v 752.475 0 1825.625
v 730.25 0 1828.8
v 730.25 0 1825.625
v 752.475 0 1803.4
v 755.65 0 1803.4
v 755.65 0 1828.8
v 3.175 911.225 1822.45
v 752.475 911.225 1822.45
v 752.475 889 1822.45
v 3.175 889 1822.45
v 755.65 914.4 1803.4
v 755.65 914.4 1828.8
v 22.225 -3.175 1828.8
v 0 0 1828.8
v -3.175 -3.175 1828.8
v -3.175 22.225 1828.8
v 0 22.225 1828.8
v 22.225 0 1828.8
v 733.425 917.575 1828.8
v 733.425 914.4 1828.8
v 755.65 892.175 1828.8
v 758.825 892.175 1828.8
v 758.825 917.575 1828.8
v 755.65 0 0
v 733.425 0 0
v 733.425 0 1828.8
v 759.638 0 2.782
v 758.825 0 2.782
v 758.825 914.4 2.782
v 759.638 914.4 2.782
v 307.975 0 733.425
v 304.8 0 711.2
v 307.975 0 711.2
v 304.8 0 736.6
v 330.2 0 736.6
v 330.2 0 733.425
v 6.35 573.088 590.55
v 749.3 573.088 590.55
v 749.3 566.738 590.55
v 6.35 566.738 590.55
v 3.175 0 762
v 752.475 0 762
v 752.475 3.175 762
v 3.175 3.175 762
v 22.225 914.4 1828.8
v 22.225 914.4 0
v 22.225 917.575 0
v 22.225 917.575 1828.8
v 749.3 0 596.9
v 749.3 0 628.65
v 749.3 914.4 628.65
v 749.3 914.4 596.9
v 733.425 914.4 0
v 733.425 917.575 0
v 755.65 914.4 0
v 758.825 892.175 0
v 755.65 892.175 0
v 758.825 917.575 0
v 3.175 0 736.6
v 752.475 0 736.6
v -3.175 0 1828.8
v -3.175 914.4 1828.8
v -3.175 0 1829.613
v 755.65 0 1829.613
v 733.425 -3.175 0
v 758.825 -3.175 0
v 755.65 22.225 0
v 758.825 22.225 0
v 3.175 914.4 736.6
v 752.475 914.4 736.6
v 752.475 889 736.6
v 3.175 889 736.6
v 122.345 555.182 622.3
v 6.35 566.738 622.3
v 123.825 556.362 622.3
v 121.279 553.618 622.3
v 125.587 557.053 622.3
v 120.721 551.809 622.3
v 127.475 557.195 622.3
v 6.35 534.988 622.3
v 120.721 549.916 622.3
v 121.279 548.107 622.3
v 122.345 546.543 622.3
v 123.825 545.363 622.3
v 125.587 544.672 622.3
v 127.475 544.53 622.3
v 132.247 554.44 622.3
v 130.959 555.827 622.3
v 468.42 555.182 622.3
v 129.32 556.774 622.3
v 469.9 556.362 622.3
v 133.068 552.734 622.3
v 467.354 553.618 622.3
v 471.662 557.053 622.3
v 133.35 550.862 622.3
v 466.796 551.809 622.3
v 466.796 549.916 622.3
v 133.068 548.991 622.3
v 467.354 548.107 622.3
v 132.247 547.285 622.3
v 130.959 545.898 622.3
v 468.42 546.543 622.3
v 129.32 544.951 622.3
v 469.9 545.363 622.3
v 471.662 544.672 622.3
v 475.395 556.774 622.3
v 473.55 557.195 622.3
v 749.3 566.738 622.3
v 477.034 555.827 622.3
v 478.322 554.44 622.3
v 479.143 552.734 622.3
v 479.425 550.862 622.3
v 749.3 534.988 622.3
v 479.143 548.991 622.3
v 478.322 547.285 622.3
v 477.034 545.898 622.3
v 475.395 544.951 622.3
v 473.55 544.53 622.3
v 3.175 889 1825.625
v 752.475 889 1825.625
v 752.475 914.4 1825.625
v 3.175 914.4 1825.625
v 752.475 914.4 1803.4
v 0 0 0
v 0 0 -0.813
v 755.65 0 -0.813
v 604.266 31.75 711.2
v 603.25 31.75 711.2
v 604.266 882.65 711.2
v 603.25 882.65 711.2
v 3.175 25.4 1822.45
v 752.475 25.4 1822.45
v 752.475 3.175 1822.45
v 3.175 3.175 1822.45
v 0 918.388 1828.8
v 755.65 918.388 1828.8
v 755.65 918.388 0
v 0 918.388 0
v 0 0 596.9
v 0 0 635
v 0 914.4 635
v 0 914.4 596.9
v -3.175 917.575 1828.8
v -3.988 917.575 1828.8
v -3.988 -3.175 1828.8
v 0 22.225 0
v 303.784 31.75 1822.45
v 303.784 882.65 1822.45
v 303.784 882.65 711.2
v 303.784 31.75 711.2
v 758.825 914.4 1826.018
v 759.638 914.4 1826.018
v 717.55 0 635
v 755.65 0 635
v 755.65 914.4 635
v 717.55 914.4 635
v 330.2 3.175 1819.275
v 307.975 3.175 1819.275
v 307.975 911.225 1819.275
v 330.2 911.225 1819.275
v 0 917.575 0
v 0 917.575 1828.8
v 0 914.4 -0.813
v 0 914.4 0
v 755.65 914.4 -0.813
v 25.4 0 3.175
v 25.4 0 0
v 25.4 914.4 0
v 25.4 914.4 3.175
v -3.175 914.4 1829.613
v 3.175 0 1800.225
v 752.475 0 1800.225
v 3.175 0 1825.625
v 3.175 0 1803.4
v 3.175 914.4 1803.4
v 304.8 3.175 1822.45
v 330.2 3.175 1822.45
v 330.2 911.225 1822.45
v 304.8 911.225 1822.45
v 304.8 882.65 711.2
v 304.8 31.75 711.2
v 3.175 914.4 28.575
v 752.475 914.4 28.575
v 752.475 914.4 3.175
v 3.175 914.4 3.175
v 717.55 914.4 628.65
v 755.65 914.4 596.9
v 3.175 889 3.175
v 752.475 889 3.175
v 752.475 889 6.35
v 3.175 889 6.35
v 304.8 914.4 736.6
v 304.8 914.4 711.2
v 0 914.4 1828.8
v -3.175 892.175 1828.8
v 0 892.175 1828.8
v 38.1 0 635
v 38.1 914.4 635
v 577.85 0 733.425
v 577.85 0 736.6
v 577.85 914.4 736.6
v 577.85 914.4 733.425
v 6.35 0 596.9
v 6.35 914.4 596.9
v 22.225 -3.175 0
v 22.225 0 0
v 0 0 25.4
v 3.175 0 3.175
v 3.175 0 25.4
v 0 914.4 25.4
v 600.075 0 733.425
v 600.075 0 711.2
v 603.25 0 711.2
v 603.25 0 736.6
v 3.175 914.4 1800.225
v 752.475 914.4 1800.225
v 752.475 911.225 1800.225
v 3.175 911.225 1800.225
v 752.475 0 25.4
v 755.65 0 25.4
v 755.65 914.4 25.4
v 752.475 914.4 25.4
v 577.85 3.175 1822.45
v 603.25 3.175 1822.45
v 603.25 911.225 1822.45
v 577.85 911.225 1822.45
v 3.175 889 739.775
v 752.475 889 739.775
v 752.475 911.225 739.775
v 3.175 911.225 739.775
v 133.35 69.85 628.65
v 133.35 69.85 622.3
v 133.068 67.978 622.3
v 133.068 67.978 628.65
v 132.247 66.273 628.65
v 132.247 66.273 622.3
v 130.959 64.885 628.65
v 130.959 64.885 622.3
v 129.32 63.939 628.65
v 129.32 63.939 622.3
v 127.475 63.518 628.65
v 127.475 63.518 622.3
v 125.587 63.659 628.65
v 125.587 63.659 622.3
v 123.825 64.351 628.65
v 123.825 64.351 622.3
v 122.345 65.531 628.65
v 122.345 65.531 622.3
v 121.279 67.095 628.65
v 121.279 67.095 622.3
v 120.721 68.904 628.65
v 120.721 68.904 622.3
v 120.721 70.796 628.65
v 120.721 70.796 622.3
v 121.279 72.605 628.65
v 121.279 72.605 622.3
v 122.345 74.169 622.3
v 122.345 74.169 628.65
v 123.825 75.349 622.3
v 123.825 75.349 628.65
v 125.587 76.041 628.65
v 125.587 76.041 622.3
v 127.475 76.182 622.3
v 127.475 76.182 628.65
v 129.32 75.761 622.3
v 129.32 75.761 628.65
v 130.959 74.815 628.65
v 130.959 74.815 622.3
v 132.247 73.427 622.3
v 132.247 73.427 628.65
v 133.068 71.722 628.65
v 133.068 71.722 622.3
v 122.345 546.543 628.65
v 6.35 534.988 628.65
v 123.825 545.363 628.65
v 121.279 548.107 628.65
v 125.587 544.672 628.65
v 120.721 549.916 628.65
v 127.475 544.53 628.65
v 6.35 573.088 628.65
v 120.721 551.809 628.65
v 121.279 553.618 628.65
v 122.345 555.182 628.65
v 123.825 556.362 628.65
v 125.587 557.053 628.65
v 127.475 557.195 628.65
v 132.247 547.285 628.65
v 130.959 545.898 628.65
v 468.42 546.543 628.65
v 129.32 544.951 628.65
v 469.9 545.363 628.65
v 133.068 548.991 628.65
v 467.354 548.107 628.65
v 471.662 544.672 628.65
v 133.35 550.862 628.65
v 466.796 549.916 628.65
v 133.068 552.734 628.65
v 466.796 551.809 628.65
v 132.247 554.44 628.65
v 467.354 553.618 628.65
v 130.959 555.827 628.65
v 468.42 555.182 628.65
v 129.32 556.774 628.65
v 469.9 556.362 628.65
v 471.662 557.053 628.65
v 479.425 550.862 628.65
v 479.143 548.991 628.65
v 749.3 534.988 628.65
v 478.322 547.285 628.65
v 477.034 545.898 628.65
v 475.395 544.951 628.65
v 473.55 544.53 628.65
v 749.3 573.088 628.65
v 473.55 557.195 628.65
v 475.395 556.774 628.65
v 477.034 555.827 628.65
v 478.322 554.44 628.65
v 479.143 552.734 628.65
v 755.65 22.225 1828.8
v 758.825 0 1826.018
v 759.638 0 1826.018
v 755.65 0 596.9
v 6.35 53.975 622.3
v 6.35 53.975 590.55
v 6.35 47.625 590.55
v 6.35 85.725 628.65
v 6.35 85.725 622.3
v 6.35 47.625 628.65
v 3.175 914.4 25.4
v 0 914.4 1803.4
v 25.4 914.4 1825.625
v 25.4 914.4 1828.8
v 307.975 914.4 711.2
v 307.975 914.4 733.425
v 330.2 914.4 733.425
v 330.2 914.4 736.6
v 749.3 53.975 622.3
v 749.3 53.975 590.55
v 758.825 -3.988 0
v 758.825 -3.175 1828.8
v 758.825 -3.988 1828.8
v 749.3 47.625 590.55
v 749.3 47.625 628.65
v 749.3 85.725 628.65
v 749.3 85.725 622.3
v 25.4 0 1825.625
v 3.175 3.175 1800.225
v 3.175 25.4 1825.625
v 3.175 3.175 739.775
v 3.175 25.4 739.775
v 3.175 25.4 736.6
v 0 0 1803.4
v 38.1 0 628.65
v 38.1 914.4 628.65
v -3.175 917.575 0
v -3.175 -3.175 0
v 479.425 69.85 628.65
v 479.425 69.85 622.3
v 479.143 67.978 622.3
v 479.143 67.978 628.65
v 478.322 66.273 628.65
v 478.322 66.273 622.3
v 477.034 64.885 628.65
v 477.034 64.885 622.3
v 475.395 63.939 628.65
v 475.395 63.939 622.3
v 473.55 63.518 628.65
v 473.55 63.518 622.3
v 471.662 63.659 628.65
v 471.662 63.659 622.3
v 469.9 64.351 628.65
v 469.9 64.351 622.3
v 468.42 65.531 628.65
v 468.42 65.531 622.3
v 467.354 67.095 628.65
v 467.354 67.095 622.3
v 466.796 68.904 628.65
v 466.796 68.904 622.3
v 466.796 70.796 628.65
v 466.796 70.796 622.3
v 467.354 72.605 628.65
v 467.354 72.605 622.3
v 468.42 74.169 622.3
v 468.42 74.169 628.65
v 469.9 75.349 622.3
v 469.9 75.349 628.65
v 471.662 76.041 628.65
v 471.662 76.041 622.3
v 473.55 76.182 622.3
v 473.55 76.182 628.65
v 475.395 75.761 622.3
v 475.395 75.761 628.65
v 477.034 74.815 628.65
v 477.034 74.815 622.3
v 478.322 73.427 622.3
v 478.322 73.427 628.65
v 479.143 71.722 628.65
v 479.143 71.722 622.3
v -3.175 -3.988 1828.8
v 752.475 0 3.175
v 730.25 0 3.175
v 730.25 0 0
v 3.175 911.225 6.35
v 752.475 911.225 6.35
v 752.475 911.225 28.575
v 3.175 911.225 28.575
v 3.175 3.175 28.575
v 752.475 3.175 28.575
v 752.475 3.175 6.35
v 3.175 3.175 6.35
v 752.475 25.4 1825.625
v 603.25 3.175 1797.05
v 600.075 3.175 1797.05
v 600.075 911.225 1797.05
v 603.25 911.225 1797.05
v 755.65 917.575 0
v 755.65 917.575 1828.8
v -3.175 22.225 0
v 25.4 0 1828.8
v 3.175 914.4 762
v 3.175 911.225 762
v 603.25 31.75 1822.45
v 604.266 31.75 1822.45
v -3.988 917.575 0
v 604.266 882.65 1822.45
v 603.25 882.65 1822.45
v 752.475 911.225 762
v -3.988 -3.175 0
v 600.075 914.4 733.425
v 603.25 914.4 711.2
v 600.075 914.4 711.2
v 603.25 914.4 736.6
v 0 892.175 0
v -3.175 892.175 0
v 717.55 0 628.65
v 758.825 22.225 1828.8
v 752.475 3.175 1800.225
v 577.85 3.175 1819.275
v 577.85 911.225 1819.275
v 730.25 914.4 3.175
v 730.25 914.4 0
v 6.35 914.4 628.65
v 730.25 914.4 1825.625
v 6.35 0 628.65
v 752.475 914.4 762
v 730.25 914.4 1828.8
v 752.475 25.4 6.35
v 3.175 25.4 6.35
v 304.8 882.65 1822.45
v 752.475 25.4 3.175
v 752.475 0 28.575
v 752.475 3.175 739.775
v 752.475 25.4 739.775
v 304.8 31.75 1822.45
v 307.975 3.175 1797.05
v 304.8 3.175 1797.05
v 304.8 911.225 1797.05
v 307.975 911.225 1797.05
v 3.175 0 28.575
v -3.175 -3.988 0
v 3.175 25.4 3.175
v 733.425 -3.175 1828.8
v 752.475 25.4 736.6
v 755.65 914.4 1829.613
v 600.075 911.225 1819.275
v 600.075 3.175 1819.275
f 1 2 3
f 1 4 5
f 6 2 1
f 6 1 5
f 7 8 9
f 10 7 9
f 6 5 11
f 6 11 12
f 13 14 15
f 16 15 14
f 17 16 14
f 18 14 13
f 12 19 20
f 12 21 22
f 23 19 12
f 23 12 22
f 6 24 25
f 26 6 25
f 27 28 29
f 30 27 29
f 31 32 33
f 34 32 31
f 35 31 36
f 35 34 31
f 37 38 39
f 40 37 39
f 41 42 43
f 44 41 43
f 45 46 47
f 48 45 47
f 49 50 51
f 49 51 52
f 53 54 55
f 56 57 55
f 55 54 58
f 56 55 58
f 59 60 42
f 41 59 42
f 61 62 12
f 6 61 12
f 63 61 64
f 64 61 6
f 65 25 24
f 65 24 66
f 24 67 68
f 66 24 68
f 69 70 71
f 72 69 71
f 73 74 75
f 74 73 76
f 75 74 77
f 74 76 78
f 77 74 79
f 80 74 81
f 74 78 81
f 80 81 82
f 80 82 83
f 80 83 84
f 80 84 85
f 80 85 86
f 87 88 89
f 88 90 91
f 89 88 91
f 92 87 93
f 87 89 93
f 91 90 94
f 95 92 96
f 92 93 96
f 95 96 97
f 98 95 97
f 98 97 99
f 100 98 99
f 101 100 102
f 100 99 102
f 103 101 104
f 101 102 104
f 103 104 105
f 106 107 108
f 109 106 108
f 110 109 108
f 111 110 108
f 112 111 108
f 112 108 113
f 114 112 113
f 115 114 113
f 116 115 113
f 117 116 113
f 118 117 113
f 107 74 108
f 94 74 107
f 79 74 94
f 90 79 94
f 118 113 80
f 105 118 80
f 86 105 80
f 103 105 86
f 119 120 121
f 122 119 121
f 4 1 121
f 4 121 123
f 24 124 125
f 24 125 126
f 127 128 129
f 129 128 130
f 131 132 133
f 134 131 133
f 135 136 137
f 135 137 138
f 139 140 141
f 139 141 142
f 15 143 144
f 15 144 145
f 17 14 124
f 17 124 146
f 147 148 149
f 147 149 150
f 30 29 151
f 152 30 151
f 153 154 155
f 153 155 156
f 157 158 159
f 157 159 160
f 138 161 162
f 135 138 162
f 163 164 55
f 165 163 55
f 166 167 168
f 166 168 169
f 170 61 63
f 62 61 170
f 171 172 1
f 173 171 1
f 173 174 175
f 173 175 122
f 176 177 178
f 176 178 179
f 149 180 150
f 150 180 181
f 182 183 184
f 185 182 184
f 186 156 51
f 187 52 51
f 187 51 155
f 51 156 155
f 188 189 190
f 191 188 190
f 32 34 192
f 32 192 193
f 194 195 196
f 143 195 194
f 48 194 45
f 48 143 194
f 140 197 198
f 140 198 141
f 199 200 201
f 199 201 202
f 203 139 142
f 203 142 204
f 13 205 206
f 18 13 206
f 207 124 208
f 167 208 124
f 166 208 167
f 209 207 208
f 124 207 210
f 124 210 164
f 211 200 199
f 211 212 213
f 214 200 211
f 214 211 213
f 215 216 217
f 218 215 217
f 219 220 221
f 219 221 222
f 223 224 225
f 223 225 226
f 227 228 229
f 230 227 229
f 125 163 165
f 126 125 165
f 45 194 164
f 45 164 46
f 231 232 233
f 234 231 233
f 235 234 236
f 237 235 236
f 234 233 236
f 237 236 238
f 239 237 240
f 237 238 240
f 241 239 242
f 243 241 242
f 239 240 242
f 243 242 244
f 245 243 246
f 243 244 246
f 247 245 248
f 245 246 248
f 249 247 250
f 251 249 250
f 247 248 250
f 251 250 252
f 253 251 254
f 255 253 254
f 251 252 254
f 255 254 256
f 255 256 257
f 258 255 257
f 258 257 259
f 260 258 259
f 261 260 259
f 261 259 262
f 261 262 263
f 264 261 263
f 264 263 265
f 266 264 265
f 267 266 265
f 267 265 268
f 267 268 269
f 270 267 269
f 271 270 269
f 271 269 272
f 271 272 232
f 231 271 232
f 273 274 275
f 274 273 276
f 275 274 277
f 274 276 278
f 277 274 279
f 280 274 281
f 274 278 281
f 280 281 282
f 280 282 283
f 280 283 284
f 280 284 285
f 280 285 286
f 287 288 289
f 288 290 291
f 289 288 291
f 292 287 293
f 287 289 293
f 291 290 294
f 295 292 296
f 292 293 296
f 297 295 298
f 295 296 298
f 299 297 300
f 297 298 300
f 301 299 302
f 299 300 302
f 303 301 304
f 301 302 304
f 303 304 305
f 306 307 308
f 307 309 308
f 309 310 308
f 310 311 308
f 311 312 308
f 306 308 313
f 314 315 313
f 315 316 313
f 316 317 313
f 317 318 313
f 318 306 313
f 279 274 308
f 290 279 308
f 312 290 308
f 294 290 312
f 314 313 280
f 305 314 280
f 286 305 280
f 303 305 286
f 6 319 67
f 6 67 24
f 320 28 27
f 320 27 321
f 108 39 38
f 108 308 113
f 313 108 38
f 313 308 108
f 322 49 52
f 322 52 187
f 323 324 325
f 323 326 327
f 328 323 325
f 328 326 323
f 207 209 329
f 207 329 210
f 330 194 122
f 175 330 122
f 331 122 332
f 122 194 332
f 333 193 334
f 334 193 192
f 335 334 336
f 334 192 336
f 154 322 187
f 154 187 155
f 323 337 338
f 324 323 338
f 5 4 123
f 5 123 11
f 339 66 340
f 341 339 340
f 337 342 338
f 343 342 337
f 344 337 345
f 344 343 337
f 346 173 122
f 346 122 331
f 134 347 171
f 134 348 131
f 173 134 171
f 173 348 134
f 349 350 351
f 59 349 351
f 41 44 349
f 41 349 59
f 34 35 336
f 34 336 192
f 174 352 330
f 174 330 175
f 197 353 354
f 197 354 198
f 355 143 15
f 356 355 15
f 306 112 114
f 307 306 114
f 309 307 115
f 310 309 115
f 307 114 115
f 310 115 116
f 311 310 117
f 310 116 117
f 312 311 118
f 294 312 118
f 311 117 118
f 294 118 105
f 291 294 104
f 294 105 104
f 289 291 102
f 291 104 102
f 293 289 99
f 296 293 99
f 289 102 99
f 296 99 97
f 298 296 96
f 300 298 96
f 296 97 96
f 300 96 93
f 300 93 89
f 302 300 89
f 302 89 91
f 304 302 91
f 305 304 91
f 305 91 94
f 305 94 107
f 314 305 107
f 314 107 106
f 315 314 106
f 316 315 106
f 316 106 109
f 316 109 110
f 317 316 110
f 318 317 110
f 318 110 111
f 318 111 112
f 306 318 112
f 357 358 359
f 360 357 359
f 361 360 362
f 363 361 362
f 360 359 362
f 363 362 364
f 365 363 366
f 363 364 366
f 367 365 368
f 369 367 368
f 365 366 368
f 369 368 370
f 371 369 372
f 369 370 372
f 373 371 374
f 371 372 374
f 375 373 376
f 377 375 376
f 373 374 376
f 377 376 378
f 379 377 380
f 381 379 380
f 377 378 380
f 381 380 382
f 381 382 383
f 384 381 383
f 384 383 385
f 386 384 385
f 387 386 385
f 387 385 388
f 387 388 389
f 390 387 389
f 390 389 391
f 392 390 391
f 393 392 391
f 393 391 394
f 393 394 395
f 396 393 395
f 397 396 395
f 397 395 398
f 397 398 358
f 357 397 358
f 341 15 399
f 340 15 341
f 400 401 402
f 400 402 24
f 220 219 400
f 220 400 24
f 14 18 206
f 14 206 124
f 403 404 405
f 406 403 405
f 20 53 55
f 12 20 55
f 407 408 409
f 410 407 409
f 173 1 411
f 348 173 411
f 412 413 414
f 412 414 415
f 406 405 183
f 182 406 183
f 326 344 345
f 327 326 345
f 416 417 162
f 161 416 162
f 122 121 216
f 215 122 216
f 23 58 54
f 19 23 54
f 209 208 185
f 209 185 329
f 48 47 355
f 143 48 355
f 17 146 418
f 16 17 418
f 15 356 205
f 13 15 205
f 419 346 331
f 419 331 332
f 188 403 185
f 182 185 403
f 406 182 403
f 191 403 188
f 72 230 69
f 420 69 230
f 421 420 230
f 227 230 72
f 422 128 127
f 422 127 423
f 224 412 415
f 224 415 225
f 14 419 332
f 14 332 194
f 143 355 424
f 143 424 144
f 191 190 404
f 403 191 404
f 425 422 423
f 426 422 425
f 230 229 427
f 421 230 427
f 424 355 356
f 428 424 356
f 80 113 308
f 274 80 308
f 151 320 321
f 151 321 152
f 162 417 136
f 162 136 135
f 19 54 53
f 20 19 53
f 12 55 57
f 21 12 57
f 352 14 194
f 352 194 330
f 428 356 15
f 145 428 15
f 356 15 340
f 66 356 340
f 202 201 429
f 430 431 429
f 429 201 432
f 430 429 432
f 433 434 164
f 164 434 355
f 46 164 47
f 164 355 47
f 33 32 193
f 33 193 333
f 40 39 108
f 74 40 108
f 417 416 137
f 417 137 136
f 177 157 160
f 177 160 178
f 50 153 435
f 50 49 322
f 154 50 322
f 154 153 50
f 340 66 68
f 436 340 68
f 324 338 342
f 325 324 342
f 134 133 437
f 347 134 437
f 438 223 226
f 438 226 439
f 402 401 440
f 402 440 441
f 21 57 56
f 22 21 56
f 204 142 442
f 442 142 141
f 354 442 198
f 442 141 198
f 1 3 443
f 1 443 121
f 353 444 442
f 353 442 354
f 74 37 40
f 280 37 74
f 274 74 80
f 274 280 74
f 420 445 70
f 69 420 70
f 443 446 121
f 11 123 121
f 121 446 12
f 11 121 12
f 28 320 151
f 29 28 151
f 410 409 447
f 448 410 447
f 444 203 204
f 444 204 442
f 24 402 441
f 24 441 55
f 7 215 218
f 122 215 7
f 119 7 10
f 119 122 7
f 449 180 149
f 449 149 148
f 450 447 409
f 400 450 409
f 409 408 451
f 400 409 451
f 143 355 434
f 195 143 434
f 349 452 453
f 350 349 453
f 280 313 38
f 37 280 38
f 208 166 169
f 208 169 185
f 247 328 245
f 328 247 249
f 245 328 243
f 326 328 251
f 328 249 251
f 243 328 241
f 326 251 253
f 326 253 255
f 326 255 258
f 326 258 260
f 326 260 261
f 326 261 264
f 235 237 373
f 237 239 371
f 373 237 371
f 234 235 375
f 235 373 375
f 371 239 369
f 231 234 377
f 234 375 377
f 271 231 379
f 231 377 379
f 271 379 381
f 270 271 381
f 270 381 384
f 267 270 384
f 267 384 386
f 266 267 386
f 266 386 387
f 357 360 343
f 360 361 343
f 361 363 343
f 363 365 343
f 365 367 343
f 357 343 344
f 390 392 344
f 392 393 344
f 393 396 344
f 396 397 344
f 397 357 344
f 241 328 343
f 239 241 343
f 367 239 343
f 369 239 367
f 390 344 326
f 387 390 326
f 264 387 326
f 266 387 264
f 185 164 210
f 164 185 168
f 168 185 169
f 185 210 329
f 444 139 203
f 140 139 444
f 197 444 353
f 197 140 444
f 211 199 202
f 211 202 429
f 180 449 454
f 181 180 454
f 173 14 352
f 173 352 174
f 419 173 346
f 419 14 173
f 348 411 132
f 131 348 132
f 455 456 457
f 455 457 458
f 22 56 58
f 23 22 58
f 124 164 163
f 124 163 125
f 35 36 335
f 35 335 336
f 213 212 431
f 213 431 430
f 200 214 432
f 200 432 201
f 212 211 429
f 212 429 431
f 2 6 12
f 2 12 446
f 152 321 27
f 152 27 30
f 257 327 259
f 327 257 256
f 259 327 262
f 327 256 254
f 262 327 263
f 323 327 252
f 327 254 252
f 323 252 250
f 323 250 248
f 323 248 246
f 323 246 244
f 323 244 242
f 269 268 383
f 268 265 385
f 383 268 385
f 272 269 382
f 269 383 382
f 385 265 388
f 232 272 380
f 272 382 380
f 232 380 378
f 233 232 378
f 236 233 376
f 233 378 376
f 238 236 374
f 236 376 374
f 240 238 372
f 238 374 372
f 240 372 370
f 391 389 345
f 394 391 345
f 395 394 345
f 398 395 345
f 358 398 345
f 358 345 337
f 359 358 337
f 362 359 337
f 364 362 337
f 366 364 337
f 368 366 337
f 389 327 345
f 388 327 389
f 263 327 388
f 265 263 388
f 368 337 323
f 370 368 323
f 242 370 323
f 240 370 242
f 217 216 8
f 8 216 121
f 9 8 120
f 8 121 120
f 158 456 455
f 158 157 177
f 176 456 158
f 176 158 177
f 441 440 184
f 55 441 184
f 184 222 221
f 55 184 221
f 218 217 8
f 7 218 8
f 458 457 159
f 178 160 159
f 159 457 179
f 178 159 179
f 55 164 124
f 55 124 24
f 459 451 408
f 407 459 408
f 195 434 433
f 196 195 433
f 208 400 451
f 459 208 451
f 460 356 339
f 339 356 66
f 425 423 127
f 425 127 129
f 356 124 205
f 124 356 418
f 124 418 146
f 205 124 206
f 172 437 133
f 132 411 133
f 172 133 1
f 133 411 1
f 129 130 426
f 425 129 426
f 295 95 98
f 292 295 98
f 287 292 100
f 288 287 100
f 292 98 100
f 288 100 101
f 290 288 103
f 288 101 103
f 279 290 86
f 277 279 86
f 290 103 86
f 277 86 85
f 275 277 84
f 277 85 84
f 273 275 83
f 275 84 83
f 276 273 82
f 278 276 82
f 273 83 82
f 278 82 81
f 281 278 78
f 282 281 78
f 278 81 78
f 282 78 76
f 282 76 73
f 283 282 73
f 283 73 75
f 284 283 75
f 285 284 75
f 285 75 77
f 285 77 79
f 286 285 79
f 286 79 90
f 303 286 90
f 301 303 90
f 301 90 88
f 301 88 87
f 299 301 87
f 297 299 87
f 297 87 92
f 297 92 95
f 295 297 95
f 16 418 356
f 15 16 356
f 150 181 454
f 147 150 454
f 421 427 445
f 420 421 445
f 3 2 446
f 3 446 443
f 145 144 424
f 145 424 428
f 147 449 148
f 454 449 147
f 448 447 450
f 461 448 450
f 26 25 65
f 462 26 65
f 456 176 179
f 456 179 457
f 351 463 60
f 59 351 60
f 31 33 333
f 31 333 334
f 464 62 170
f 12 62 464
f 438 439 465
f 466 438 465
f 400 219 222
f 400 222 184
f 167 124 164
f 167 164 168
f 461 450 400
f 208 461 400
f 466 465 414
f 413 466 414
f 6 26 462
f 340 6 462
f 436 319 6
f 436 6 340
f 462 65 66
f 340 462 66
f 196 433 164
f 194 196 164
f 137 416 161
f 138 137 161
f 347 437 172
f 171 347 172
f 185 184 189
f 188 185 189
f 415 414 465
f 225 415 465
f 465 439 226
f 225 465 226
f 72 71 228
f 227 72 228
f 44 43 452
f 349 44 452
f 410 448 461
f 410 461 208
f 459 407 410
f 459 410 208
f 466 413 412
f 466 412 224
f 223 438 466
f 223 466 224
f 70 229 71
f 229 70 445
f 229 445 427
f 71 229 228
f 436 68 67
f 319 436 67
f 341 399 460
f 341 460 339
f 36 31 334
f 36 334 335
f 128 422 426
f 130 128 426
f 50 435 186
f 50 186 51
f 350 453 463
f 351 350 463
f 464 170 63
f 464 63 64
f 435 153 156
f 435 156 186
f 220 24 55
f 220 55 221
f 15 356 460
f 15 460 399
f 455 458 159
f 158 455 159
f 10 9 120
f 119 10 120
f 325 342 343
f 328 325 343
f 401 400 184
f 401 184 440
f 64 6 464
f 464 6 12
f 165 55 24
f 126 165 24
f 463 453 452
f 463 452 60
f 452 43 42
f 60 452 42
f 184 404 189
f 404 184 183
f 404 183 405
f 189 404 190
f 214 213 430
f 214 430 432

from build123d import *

# Parameters (mm, degrees)
F1_DEPTH       = 914.4
F3_DEPTH       = 1828.8
F5_DEPTH       = 749.3
F6_R           = 6.35
F6_W           = 3.175
F6_H           = 487.3625
F6_H_2         = 6.35
F6_H_3         = 31.75
F7_DEPTH       = 50.8
F7_DEPTH_BACK  = 50.8
F8_W           = 850.9
F8_H           = 1111.25
F9_DEPTH       = 1.016
F10_W          = 3.175
F10_H          = 25.4
F11_DEPTH      = 581.026
F11_DEPTH_BACK = 180.976
F13_W          = 850.9
F13_H          = 1111.25
F14_DEPTH      = 1.016
F12_W          = 914.4
F12_H          = 1823.2365249493
F16_DEPTH      = 0.8128
F15_W          = 920.75
F15_H          = 1828.8
F17_DEPTH      = 0.8128
F18_W          = 758.825
F18_H          = 914.4
F19_DEPTH      = 0.8128
F20_W          = 755.65
F20_H          = 914.4
F21_DEPTH      = 0.8128
F22_W          = 755.65
F22_H          = 1828.8
F23_DEPTH      = 0.8128
F24_W          = 762
F24_H          = 1828.8
F25_DEPTH      = 0.8128


with BuildPart() as f1:
    # F0 (on Front) → F1 (new body)
    with BuildSketch(Plane.XZ):
        Polygon((0, 25.4), (0, 0), (25.4, 0), (25.4, 3.175), (3.175, 3.175), (3.175, 25.4), align=None)
    extrude(amount=-F1_DEPTH)


with BuildPart() as f1b:
    # F0 (on Front) → F1, piece 2 (new body)
    with BuildSketch(Plane.XZ):
        Polygon((730.25, 3.175), (730.25, 0), (755.65, 0), (755.65, 25.4), (752.475, 25.4), (752.475, 3.175), align=None)
    extrude(amount=-F1_DEPTH)


with BuildPart() as f1c:
    # F0 (on Front) → F1, piece 3 (new body)
    with BuildSketch(Plane.XZ):
        Polygon((755.65, 1828.8), (730.25, 1828.8), (730.25, 1825.625), (752.475, 1825.625), (752.475, 1803.4), (755.65, 1803.4), align=None)
    extrude(amount=-F1_DEPTH)


with BuildPart() as f1d:
    # F0 (on Front) → F1, piece 4 (new body)
    with BuildSketch(Plane.XZ):
        Polygon((0, 1828.8), (0, 1803.4), (3.175, 1803.4), (3.175, 1825.625), (25.4, 1825.625), (25.4, 1828.8), align=None)
    extrude(amount=-F1_DEPTH)


with BuildPart() as f1e:
    # F0 (on Front) → F1, piece 5 (new body)
    with BuildSketch(Plane.XZ):
        Polygon((755.65, 635), (717.55, 635), (717.55, 628.65), (749.3, 628.65), (749.3, 596.9), (755.65, 596.9), align=None)
    extrude(amount=-F1_DEPTH)


with BuildPart() as f1f:
    # F0 (on Front) → F1, piece 6 (new body)
    with BuildSketch(Plane.XZ):
        Polygon((0, 635), (0, 596.9), (6.35, 596.9), (6.35, 628.65), (38.1, 628.65), (38.1, 635), align=None)
    extrude(amount=-F1_DEPTH)


with BuildPart() as f1g:
    # F0 (on Front) → F1, piece 7 (new body)
    with BuildSketch(Plane.XZ):
        Polygon((603.25, 736.6), (577.85, 736.6), (577.85, 733.425), (600.075, 733.425), (600.075, 711.2), (603.25, 711.2), align=None)
    extrude(amount=-F1_DEPTH)


with BuildPart() as f1h:
    # F0 (on Front) → F1, piece 8 (new body)
    with BuildSketch(Plane.XZ):
        Polygon((603.25, 1822.45), (577.85, 1822.45), (577.85, 1819.275), (600.075, 1819.275), (600.075, 1797.05), (603.25, 1797.05), align=None)
    extrude(amount=-F1_DEPTH)


with BuildPart() as f1i:
    # F0 (on Front) → F1, piece 9 (new body)
    with BuildSketch(Plane.XZ):
        Polygon((330.2, 733.425), (330.2, 736.6), (304.8, 736.6), (304.8, 711.2), (307.975, 711.2), (307.975, 733.425), align=None)
    extrude(amount=-F1_DEPTH)


with BuildPart() as f1j:
    # F0 (on Front) → F1, piece 10 (new body)
    with BuildSketch(Plane.XZ):
        Polygon((330.2, 1819.275), (330.2, 1822.45), (304.8, 1822.45), (304.8, 1797.05), (307.975, 1797.05), (307.975, 1819.275), align=None)
    extrude(amount=-F1_DEPTH)


with BuildPart() as f3:
    # F2 (on Top) → F3 (new body)
    with BuildSketch(Plane.XY):
        Polygon((0, 22.225), (-3.175, 22.225), (-3.175, -3.175), (22.225, -3.175), (22.225, 0), (0, 0), align=None)
    extrude(amount=F3_DEPTH)


with BuildPart() as f3b:
    # F2 (on Top) → F3, piece 2 (new body)
    with BuildSketch(Plane.XY):
        Polygon((733.425, 0), (733.425, -3.175), (758.825, -3.175), (758.825, 22.225), (755.65, 22.225), (755.65, 0), align=None)
    extrude(amount=F3_DEPTH)


with BuildPart() as f3c:
    # F2 (on Top) → F3, piece 3 (new body)
    with BuildSketch(Plane.XY):
        Polygon((-3.175, 892.175), (0, 892.175), (0, 914.4), (22.225, 914.4), (22.225, 917.575), (-3.175, 917.575), align=None)
    extrude(amount=F3_DEPTH)


with BuildPart() as f3d:
    # F2 (on Top) → F3, piece 4 (new body)
    with BuildSketch(Plane.XY):
        Polygon((733.425, 917.575), (733.425, 914.4), (755.65, 914.4), (755.65, 892.175), (758.825, 892.175), (758.825, 917.575), align=None)
    extrude(amount=F3_DEPTH)


with BuildPart() as f5:
    # F4 (on face) → F5 (new body, through all)
    with BuildSketch(Plane(origin=(752.475, 0, 0), x_dir=(0, -1, 0), z_dir=(-1, 0, 0))):
        Polygon((-25.4, 6.35), (-25.4, 3.175), (0, 3.175), (0, 28.575), (-3.175, 28.575), (-3.175, 6.35), align=None)
    extrude(amount=F5_DEPTH)


with BuildPart() as f5b:
    # F4 (on face) → F5, piece 2 (new body, through all)
    with BuildSketch(Plane(origin=(752.475, 0, 0), x_dir=(0, -1, 0), z_dir=(-1, 0, 0))):
        Polygon((-3.175, 1800.225), (0, 1800.225), (0, 1825.625), (-25.4, 1825.625), (-25.4, 1822.45), (-3.175, 1822.45), align=None)
    extrude(amount=F5_DEPTH)


with BuildPart() as f5c:
    # F4 (on face) → F5, piece 3 (new body, through all)
    with BuildSketch(Plane(origin=(752.475, 0, 0), x_dir=(0, -1, 0), z_dir=(-1, 0, 0))):
        Polygon((-914.4, 1825.625), (-914.4, 1800.225), (-911.225, 1800.225), (-911.225, 1822.45), (-889, 1822.45), (-889, 1825.625), align=None)
    extrude(amount=F5_DEPTH)


with BuildPart() as f5d:
    # F4 (on face) → F5, piece 4 (new body, through all)
    with BuildSketch(Plane(origin=(752.475, 0, 0), x_dir=(0, -1, 0), z_dir=(-1, 0, 0))):
        Polygon((-911.225, 28.575), (-914.4, 28.575), (-914.4, 3.175), (-889, 3.175), (-889, 6.35), (-911.225, 6.35), align=None)
    extrude(amount=F5_DEPTH)


with BuildPart() as f5e:
    # F4 (on face) → F5, piece 5 (new body, through all)
    with BuildSketch(Plane(origin=(752.475, 0, 0), x_dir=(0, -1, 0), z_dir=(-1, 0, 0))):
        Polygon((-573.0875, 628.65), (-573.0875, 590.55), (-566.7375, 590.55), (-566.7375, 622.3), (-534.9875, 622.3), (-534.9875, 628.65), align=None)
    extrude(amount=F5_DEPTH)


with BuildPart() as f5f:
    # F4 (on face) → F5, piece 6 (new body, through all)
    with BuildSketch(Plane(origin=(752.475, 0, 0), x_dir=(0, -1, 0), z_dir=(-1, 0, 0))):
        Polygon((-53.975, 590.55), (-47.625, 590.55), (-47.625, 628.65), (-85.725, 628.65), (-85.725, 622.3), (-53.975, 622.3), align=None)
    extrude(amount=F5_DEPTH)


with BuildPart() as f5g:
    # F4 (on face) → F5, piece 7 (new body, through all)
    with BuildSketch(Plane(origin=(752.475, 0, 0), x_dir=(0, -1, 0), z_dir=(-1, 0, 0))):
        Polygon((-25.4, 736.6), (0, 736.6), (0, 762), (-3.175, 762), (-3.175, 739.775), (-25.4, 739.775), align=None)
    extrude(amount=F5_DEPTH)


with BuildPart() as f5h:
    # F4 (on face) → F5, piece 8 (new body, through all)
    with BuildSketch(Plane(origin=(752.475, 0, 0), x_dir=(0, -1, 0), z_dir=(-1, 0, 0))):
        Polygon((-914.4, 736.6), (-889, 736.6), (-889, 739.775), (-911.225, 739.775), (-911.225, 762), (-914.4, 762), align=None)
    extrude(amount=F5_DEPTH)


with BuildPart() as f7_tool:
    # F6 (on face) → F7 (new body, two sides)
    with BuildSketch(Plane(origin=(0, 0, 622.3), x_dir=(1, 0, 0), z_dir=(0, 0, -1))) as f7_sk:
        with Locations((473.075, -69.85)):
            Circle(F6_R)
        with Locations((473.075, -550.8625)):
            Circle(F6_R)
        with Locations((127, -550.8625)):
            Circle(F6_R)
        with Locations((127, -69.85)):
            Circle(F6_R)
        with Locations((4.7625, -291.30625)):
            Rectangle(F6_W, F6_H)
        with Locations((750.8875, -291.30625)):
            Rectangle(F6_W, F6_H)
        with Locations((4.7625, -569.9125)):
            Rectangle(F6_W, F6_H_2)
        with Locations((4.7625, -550.8625)):
            Rectangle(F6_W, F6_H_3)
        with Locations((750.8875, -550.8625)):
            Rectangle(F6_W, F6_H_3)
        with Locations((750.8875, -569.9125)):
            Rectangle(F6_W, F6_H_2)
    extrude(amount=-F7_DEPTH)
    extrude(f7_sk.sketch, amount=F7_DEPTH_BACK)


with BuildPart() as f5e_1:
    add(f5e.part)

    # F7: cut by f7_tool
    add(f7_tool.part, mode=Mode.SUBTRACT)


with BuildPart() as f5f_1:
    add(f5f.part)

    # F7: cut by f7_tool
    add(f7_tool.part, mode=Mode.SUBTRACT)


with BuildPart() as f9:
    # F8 (on face) → F9 (new body)
    with BuildSketch(Plane.YZ.offset(603.25)):
        with Locations((457.2, 1266.825)):
            Rectangle(F8_W, F8_H)
    extrude(amount=F9_DEPTH)


with BuildPart() as f11_tool:
    # F10 (on face) → F11 (new body, two sides)
    with BuildSketch(Plane(origin=(577.85, 0, 0), x_dir=(0, -1, 0), z_dir=(-1, 0, 0))) as f11_sk:
        with Locations((-1.5875, 1809.75)):
            Rectangle(F10_W, F10_H)
        with Locations((-912.8125, 1809.75)):
            Rectangle(F10_W, F10_H)
    extrude(amount=F11_DEPTH)
    extrude(f11_sk.sketch, amount=-F11_DEPTH_BACK)


with BuildPart() as f1h_1:
    add(f1h.part)

    # F11: cut by f11_tool
    add(f11_tool.part, mode=Mode.SUBTRACT)


with BuildPart() as f1j_1:
    add(f1j.part)

    # F11: cut by f11_tool
    add(f11_tool.part, mode=Mode.SUBTRACT)


with BuildPart() as f14:
    # F13 (on face) → F14 (new body)
    with BuildSketch(Plane(origin=(304.8, 0, 0), x_dir=(0, -1, 0), z_dir=(-1, 0, 0))):
        with Locations((-457.2, 1266.825)):
            Rectangle(F13_W, F13_H)
    extrude(amount=F14_DEPTH)


with BuildPart() as f16:
    # F12 (on face) → F16 (new body)
    with BuildSketch(Plane.YZ.offset(758.825)):
        with Locations((457.2, 914.4)):
            Rectangle(F12_W, F12_H)
    extrude(amount=F16_DEPTH)


with BuildPart() as f17:
    # F15 (on face) → F17 (new body)
    with BuildSketch(Plane(origin=(-3.175, 0, 0), x_dir=(0, -1, 0), z_dir=(-1, 0, 0))):
        with Locations((-457.2, 914.4)):
            Rectangle(F15_W, F15_H)
    extrude(amount=F17_DEPTH)


with BuildPart() as f19:
    # F18 (on face) → F19 (new body)
    with BuildSketch(Plane.XY.offset(1828.8)):
        with Locations((376.2375, 457.2)):
            Rectangle(F18_W, F18_H)
    extrude(amount=F19_DEPTH)


with BuildPart() as f21:
    # F20 (on face) → F21 (new body)
    with BuildSketch(Plane(origin=(0, 0, 0), x_dir=(1, 0, 0), z_dir=(0, 0, -1))):
        with Locations((377.825, -457.2)):
            Rectangle(F20_W, F20_H)
    extrude(amount=F21_DEPTH)


with BuildPart() as f23:
    # F22 (on face) → F23 (new body)
    with BuildSketch(Plane(origin=(0, 917.575, 0), x_dir=(-1, 0, 0), z_dir=(0, 1, 0))):
        with Locations((-377.825, 914.4)):
            Rectangle(F22_W, F22_H)
    extrude(amount=F23_DEPTH)


with BuildPart() as f25:
    # F24 (on face) → F25 (new body)
    with BuildSketch(Plane.XZ.offset(3.175)):
        with Locations((377.825, 914.4)):
            Rectangle(F24_W, F24_H)
    extrude(amount=F25_DEPTH)


solid = Compound([f1.part, f1b.part, f1c.part, f1d.part, f1e.part, f1f.part, f1g.part, f1i.part, f3.part, f3b.part, f3c.part, f3d.part, f5.part, f5b.part, f5c.part, f5d.part, f5g.part, f5h.part, f5e_1.part, f5f_1.part, f9.part, f1h_1.part, f1j_1.part, f14.part, f16.part, f17.part, f19.part, f21.part, f23.part, f25.part])
